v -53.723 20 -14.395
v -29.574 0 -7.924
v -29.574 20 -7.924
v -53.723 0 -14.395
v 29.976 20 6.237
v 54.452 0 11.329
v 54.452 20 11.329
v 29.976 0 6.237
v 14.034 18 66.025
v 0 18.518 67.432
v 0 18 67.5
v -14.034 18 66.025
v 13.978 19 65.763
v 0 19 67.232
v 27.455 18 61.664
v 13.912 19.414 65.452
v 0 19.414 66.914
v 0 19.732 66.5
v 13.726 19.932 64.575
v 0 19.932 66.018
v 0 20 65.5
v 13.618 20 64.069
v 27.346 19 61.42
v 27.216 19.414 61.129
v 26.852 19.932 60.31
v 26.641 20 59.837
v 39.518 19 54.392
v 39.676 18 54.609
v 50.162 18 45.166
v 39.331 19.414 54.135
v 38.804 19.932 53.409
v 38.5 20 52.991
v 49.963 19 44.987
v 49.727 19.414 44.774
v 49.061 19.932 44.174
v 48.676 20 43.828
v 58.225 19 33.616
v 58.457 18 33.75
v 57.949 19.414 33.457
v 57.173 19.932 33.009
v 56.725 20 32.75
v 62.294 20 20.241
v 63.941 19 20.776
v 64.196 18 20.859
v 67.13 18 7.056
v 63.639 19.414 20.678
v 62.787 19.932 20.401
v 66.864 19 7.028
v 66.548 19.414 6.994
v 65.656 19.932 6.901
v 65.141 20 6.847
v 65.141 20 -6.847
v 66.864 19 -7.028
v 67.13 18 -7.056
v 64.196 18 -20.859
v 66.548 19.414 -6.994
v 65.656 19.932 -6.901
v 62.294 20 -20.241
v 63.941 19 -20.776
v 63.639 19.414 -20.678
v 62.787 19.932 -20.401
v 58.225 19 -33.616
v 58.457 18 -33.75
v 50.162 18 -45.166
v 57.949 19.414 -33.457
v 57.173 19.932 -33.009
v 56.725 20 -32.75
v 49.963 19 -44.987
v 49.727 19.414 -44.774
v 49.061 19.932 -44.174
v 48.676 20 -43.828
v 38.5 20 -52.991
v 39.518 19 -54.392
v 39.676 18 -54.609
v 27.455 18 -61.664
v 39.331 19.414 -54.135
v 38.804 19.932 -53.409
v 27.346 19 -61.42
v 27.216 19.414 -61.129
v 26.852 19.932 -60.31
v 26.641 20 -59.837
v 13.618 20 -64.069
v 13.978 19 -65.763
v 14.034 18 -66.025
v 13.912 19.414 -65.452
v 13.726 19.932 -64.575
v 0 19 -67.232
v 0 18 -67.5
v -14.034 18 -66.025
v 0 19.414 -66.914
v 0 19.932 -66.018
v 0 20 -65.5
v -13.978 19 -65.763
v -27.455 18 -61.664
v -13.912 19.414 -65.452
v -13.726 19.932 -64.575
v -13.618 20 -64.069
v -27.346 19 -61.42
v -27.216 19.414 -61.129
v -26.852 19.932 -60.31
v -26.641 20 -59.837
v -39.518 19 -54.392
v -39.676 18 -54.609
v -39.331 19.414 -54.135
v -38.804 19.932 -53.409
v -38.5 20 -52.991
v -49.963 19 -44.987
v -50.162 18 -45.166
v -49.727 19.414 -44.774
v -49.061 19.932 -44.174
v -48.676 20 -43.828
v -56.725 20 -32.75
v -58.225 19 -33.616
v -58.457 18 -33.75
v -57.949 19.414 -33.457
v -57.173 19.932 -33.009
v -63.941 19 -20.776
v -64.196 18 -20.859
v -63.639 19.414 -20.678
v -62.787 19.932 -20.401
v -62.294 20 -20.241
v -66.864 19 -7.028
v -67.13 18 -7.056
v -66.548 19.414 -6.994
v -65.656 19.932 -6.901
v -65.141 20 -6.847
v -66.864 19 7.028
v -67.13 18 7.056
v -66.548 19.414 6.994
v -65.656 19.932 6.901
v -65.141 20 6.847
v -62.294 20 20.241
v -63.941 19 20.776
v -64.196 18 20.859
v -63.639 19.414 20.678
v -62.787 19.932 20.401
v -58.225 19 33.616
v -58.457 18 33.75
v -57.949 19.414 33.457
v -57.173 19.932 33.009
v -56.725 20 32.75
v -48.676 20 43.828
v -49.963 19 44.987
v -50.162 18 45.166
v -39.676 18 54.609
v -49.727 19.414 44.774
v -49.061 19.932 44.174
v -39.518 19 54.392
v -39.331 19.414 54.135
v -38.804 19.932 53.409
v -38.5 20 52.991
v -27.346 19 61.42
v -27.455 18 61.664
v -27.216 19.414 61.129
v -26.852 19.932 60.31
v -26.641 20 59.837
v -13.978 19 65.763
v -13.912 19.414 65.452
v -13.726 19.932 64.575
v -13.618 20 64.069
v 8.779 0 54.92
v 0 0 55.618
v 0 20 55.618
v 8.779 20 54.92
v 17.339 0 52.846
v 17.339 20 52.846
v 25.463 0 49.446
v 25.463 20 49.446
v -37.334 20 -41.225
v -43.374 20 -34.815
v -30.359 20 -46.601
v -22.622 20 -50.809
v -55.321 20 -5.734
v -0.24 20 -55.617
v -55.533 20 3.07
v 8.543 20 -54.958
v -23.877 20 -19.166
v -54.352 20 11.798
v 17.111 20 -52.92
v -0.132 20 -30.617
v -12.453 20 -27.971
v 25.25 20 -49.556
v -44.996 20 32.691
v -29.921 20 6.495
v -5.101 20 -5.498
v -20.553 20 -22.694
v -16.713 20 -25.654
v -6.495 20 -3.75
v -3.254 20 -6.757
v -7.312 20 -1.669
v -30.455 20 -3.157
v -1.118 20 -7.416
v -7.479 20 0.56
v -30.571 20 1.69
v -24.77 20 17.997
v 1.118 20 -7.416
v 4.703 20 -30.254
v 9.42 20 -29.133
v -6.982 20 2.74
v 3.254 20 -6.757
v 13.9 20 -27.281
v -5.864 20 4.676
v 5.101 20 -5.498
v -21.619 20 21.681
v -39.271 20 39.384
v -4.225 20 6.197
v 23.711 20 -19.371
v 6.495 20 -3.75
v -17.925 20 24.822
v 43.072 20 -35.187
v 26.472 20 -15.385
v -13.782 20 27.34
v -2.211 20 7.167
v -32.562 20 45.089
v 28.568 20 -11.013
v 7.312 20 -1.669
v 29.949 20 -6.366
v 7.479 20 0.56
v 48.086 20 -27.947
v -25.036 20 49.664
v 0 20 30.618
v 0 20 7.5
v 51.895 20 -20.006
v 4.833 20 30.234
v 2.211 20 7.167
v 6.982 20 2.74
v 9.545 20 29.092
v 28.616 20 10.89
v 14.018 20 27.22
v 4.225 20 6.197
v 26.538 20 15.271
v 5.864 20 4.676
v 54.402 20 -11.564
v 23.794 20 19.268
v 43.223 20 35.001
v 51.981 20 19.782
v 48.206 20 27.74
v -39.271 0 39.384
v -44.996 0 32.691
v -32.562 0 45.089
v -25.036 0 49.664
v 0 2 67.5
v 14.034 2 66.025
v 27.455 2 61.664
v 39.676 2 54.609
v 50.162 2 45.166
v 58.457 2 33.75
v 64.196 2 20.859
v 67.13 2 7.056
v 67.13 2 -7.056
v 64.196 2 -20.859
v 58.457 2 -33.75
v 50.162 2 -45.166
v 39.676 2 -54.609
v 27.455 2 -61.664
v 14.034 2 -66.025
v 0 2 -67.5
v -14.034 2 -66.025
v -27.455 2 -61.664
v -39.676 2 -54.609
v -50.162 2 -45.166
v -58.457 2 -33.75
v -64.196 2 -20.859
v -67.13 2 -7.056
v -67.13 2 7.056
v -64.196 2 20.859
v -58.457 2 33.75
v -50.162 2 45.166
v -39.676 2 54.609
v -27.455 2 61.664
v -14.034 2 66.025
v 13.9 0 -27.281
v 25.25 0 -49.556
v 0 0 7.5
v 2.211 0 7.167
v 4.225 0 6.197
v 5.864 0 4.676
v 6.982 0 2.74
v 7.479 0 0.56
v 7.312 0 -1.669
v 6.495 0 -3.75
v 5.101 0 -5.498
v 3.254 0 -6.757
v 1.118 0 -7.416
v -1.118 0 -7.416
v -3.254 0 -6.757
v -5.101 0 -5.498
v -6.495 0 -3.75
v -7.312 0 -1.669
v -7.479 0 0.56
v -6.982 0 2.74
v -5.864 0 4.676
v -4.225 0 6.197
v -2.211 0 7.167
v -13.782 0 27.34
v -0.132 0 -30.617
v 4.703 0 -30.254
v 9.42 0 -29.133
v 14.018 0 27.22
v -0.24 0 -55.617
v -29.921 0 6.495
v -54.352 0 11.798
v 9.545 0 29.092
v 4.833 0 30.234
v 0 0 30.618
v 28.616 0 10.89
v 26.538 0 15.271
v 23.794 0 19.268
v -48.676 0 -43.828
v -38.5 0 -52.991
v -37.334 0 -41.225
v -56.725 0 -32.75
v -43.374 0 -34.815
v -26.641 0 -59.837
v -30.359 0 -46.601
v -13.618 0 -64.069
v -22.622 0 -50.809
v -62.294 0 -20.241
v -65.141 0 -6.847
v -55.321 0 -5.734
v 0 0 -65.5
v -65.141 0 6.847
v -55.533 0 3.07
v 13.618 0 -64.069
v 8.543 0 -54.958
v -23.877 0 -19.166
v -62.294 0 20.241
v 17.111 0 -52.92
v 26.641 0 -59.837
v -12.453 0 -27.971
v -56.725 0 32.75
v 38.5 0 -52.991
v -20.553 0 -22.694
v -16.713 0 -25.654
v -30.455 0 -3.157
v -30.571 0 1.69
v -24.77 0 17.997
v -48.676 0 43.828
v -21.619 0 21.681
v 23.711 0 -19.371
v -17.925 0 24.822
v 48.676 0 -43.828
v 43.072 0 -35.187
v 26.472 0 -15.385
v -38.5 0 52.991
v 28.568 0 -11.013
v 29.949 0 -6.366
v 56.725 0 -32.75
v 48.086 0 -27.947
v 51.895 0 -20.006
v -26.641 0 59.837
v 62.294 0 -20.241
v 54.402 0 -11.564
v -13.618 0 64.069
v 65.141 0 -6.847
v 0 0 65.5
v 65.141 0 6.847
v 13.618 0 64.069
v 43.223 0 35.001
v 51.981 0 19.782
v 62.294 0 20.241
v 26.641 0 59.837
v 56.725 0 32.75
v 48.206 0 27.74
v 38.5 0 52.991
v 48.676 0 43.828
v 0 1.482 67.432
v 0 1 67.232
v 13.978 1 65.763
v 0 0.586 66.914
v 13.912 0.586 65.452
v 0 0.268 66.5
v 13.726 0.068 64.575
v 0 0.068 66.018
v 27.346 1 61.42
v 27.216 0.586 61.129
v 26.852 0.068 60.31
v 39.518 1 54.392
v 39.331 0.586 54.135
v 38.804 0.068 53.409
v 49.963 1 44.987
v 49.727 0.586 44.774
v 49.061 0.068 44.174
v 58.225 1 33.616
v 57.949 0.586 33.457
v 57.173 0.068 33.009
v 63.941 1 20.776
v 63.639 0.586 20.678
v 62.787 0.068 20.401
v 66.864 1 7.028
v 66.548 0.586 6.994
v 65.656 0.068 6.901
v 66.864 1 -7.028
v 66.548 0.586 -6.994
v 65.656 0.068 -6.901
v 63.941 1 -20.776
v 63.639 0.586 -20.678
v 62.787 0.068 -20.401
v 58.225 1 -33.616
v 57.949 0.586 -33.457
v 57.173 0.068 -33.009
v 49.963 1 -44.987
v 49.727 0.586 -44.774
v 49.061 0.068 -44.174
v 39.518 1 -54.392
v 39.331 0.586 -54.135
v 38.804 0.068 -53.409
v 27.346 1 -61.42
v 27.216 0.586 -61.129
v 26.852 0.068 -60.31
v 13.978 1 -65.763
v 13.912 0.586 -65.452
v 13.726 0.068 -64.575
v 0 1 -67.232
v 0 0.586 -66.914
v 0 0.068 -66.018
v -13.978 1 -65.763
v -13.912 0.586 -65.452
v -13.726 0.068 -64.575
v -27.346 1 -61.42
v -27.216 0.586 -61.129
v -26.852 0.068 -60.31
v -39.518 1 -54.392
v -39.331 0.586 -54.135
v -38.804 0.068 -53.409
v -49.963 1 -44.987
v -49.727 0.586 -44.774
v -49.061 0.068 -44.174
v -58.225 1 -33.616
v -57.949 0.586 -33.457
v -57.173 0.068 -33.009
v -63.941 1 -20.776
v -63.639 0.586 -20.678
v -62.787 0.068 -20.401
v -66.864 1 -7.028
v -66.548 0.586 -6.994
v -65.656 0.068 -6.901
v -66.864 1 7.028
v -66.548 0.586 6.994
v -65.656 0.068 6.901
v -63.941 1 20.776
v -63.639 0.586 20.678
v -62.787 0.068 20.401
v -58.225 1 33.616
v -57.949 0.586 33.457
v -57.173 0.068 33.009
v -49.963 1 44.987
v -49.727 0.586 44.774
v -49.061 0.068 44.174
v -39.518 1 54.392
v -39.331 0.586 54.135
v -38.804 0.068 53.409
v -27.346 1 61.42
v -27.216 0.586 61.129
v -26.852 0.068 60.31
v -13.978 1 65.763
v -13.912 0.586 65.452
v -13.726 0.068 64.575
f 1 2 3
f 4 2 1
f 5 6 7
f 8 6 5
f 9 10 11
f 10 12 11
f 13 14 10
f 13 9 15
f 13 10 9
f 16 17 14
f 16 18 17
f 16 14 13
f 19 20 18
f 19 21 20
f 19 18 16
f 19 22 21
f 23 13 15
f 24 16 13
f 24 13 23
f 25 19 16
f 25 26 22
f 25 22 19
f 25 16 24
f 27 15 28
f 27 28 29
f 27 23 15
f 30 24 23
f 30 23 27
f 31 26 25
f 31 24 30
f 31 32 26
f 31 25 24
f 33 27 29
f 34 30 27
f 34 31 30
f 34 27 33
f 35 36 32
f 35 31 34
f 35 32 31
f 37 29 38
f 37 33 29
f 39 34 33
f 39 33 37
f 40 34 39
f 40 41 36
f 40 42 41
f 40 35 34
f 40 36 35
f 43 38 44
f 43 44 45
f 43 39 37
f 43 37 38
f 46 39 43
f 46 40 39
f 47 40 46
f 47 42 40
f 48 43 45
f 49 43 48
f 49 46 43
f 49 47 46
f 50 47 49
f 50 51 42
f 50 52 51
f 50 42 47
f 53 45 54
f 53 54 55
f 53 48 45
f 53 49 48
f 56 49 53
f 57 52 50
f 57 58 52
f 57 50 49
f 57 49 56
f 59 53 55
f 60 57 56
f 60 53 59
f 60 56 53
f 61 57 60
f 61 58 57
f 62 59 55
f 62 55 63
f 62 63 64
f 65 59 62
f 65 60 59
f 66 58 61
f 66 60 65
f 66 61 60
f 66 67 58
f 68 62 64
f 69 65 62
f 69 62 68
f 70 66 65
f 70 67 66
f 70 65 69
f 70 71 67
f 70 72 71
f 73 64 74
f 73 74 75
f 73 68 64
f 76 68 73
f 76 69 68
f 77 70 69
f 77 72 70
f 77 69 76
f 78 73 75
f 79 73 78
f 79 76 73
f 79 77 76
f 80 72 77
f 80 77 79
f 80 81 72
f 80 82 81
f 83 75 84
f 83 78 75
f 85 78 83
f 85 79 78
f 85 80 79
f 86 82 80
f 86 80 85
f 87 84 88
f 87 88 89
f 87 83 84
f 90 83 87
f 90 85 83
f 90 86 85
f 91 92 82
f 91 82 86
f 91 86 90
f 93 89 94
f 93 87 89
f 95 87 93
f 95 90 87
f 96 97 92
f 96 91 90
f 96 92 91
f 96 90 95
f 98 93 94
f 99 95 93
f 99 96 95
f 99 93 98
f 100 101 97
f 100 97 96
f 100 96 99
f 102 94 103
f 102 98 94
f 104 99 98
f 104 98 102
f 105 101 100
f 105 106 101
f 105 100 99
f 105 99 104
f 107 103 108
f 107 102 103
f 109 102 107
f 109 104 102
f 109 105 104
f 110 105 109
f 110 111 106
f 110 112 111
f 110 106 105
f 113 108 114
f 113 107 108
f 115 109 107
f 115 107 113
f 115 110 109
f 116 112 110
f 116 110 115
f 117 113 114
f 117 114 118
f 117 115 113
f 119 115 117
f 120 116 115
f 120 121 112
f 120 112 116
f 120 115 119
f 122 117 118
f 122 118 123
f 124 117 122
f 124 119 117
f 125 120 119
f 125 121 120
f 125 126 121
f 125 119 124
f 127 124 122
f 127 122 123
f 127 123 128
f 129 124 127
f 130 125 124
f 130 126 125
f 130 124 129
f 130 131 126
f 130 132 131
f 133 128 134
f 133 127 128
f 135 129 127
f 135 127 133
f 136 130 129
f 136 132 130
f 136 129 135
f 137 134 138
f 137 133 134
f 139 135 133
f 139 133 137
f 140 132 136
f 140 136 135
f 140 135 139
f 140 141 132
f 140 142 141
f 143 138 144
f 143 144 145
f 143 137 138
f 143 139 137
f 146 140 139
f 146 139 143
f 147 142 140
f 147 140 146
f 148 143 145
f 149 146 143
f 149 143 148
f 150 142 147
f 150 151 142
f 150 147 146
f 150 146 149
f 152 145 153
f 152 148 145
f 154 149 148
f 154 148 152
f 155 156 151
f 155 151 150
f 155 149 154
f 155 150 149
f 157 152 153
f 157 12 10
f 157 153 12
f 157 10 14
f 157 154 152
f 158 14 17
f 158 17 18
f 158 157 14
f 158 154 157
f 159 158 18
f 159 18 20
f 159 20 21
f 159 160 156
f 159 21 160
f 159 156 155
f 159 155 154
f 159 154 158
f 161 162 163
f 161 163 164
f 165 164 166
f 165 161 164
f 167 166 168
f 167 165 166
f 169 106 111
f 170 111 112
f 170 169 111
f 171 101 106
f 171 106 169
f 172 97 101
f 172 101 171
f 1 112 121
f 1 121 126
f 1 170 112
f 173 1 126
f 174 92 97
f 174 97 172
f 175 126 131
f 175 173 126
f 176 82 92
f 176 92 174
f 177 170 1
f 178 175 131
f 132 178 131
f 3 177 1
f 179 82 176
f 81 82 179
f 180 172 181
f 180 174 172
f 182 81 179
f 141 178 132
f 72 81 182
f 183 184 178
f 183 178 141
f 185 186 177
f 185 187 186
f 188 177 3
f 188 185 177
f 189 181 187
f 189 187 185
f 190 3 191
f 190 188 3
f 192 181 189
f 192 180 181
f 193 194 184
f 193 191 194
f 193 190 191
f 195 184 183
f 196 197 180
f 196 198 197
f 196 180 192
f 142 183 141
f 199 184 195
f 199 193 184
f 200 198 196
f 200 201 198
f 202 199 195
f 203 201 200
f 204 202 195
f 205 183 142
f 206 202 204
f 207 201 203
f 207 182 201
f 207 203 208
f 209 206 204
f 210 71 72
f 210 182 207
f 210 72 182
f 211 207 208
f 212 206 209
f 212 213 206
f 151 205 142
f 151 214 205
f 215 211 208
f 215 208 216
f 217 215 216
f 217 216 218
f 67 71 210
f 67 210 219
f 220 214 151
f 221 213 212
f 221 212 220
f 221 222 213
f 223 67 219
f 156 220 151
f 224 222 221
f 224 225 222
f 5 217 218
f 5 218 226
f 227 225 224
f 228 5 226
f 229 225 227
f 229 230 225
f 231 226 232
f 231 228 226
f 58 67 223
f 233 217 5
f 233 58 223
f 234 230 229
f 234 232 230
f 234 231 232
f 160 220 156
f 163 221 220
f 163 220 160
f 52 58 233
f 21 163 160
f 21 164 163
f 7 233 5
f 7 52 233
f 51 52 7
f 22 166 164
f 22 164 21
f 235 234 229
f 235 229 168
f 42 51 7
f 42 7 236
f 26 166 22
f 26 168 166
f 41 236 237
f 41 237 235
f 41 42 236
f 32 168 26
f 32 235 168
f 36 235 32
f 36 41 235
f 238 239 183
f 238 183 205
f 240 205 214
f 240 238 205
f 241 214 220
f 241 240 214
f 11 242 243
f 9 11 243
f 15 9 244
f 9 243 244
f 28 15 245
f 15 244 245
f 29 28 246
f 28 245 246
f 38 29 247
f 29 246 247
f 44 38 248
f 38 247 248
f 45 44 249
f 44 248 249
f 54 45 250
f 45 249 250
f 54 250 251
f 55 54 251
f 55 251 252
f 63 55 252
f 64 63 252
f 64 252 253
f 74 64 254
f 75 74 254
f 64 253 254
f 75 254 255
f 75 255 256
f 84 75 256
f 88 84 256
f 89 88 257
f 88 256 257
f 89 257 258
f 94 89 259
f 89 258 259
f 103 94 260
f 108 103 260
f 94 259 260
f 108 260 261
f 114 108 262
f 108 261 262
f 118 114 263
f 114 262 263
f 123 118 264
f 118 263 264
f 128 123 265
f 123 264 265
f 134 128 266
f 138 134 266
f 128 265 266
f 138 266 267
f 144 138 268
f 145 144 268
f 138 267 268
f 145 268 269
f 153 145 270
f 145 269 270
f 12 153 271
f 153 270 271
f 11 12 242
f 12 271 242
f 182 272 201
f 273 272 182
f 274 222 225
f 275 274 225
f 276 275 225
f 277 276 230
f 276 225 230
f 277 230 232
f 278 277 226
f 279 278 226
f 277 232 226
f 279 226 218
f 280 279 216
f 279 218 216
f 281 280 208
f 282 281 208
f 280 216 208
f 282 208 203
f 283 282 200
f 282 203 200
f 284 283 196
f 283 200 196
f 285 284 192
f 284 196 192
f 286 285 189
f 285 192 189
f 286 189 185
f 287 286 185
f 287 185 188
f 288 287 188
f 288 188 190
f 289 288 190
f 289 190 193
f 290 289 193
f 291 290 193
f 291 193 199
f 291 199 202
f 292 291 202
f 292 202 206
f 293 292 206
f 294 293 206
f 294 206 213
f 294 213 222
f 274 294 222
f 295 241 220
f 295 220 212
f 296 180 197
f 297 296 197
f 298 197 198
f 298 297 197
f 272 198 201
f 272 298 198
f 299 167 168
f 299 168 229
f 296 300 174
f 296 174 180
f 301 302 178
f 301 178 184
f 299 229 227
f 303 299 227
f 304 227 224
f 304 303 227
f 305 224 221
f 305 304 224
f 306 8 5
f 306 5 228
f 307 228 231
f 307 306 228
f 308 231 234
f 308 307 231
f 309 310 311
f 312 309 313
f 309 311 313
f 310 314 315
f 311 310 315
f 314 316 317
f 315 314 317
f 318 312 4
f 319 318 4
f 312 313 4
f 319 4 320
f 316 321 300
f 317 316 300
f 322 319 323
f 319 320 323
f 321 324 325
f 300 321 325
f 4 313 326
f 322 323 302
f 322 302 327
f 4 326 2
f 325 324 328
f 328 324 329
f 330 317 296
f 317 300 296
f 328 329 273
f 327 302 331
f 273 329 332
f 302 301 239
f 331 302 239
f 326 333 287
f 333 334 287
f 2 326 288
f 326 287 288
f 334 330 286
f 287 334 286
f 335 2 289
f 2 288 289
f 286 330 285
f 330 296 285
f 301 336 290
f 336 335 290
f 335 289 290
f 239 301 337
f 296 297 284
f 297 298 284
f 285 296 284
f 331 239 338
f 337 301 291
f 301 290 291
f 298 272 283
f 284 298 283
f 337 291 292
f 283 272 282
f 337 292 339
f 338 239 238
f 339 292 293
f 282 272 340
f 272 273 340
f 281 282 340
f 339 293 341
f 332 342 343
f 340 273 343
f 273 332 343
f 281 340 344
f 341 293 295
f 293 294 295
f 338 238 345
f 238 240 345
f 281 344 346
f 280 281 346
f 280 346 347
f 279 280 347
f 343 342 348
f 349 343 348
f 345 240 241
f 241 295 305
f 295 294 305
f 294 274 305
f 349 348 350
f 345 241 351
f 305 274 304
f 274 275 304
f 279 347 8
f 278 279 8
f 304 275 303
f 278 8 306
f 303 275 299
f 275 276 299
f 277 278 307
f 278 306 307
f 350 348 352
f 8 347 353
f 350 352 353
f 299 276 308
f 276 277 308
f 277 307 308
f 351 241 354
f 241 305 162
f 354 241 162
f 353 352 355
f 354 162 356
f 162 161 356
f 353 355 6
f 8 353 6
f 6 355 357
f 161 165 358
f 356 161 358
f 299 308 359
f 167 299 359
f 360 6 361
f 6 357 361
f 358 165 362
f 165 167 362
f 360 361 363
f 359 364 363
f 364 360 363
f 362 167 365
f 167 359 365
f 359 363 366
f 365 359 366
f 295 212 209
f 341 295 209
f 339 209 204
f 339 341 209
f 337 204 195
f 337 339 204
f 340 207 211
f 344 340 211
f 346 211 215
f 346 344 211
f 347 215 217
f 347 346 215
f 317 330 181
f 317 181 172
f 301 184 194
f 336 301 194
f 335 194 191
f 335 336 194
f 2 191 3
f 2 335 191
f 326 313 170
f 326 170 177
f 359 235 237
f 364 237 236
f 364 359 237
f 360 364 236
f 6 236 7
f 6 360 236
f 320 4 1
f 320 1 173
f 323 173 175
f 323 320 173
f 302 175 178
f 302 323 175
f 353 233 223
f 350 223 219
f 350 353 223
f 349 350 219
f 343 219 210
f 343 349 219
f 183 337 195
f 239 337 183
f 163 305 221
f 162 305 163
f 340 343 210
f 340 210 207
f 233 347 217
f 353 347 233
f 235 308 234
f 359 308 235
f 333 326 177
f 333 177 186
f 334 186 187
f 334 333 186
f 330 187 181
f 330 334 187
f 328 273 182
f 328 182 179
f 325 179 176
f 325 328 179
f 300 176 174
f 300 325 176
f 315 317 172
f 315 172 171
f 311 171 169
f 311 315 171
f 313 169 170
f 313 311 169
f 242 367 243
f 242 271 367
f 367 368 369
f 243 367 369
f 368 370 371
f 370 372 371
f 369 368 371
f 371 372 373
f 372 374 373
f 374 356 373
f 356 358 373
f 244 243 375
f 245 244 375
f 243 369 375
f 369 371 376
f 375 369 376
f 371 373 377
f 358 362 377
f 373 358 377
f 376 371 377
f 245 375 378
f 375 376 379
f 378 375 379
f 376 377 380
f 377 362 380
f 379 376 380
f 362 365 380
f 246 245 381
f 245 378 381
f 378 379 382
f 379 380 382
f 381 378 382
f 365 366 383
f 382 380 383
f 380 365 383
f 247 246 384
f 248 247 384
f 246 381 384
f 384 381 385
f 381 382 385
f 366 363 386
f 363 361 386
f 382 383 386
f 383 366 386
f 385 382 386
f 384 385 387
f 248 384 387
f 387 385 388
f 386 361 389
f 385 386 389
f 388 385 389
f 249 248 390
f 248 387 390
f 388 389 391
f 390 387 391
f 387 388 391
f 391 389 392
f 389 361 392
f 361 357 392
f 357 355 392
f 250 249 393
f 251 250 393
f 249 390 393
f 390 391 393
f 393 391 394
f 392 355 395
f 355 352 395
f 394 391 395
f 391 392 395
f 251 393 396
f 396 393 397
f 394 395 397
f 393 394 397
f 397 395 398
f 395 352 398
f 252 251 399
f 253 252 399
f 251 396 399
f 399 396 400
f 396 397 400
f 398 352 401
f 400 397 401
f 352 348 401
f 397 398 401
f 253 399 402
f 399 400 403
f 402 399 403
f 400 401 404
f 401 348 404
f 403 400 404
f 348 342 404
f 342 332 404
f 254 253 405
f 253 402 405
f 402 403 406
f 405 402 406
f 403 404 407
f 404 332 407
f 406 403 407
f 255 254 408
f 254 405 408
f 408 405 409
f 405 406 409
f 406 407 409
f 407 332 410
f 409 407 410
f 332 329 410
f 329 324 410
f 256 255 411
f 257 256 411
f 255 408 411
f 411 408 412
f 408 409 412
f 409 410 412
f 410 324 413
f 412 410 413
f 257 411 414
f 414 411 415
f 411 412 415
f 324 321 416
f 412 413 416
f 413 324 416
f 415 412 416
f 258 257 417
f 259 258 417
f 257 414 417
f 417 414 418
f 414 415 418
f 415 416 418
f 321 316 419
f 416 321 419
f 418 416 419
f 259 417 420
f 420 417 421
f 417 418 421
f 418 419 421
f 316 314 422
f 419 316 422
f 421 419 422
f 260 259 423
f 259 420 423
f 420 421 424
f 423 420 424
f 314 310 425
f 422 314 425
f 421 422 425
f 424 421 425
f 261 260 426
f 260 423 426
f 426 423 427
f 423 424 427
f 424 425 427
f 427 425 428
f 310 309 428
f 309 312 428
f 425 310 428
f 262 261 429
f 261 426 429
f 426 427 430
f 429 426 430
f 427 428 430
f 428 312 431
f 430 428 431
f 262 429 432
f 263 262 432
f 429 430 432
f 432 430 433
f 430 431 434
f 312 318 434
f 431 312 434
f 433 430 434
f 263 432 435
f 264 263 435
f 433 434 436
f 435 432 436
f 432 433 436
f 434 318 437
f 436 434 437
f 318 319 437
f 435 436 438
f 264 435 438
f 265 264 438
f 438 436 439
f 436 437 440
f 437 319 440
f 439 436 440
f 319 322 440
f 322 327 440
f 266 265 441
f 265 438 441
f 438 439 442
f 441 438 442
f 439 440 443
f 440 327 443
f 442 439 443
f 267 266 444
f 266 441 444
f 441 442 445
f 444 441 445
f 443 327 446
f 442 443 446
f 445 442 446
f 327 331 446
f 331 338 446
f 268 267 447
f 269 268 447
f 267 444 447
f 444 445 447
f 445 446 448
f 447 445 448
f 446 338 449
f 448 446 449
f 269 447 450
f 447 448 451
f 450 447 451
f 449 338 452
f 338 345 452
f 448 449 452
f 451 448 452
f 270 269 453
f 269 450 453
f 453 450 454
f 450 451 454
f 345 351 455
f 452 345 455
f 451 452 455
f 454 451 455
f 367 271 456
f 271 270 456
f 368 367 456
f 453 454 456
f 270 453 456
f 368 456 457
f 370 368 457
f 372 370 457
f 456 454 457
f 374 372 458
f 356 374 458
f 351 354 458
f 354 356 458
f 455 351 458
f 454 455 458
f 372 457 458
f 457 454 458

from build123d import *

# Parameters (mm, degrees)
SKETCH1_R           = 67.5
BOSS_EXTRUDE1_DEPTH = 20
FILLET1_R           = 2
SKETCH2_R           = 7.5
CUT_EXTRUDE1_DEPTH  = 98.532046085
CUT_EXTRUDE2_DEPTH  = 98.532046085
CIRPATTERN1_COUNT   = 7
CIRPATTERN1_ANGLE   = 306


with BuildPart() as part:
    # Sketch1 → Boss-Extrude1 (new body)
    with BuildSketch(Plane(origin=(0, 0, 0), x_dir=(1, 0, 0), z_dir=(0, 1, 0))):
        with Locations(Location((0, 0, 0), (0, 0, 270))):
            Circle(SKETCH1_R)
    extrude(amount=BOSS_EXTRUDE1_DEPTH)

    # Fillet1
    fillet1_edges = [part.edges().sort_by_distance(p)[0] for p in [
        (0, 0, -67.5),
        (0, 20, -67.5),
    ]]
    fillet(fillet1_edges, radius=FILLET1_R)

    # Sketch2 → Cut-Extrude1 (cut, through all)
    with BuildSketch(Plane(origin=(0, 20, 0), x_dir=(1, 0, 0), z_dir=(0, 1, 0))):
        with Locations(Location((0, 0, 0), (0, 0, 270))):
            Circle(SKETCH2_R)
    extrude(amount=-CUT_EXTRUDE1_DEPTH, mode=Mode.SUBTRACT)

    # Sketch3 → Cut-Extrude2 (cut, through all)
    with BuildSketch(Plane.XZ):
        with BuildLine():
            Line((0, 30.617728898), (0, 55.617728898))
            ThreePointArc((0, 55.617728898), (13.100293951, 54.052882126), (25.463414591, 49.446398101))
            Line((25.463414591, 49.446398101), (14.017687169, 27.220392527))
            ThreePointArc((14.017687169, 27.220392527), (7.21175166, 29.756275991), (0, 30.617728898))
        make_face()
    cut_extrude2 = extrude(amount=-CUT_EXTRUDE2_DEPTH, mode=Mode.SUBTRACT)

    # CirPattern1: Cut-Extrude2 ×7 about axis
    cirpattern1_axis = Axis((0, 0, 0), (0, 1, 0))
    for i in range(1, CIRPATTERN1_COUNT):
        add(cut_extrude2.rotate(cirpattern1_axis, i * CIRPATTERN1_ANGLE / (CIRPATTERN1_COUNT - 1)), mode=Mode.SUBTRACT)


solid = part.part
